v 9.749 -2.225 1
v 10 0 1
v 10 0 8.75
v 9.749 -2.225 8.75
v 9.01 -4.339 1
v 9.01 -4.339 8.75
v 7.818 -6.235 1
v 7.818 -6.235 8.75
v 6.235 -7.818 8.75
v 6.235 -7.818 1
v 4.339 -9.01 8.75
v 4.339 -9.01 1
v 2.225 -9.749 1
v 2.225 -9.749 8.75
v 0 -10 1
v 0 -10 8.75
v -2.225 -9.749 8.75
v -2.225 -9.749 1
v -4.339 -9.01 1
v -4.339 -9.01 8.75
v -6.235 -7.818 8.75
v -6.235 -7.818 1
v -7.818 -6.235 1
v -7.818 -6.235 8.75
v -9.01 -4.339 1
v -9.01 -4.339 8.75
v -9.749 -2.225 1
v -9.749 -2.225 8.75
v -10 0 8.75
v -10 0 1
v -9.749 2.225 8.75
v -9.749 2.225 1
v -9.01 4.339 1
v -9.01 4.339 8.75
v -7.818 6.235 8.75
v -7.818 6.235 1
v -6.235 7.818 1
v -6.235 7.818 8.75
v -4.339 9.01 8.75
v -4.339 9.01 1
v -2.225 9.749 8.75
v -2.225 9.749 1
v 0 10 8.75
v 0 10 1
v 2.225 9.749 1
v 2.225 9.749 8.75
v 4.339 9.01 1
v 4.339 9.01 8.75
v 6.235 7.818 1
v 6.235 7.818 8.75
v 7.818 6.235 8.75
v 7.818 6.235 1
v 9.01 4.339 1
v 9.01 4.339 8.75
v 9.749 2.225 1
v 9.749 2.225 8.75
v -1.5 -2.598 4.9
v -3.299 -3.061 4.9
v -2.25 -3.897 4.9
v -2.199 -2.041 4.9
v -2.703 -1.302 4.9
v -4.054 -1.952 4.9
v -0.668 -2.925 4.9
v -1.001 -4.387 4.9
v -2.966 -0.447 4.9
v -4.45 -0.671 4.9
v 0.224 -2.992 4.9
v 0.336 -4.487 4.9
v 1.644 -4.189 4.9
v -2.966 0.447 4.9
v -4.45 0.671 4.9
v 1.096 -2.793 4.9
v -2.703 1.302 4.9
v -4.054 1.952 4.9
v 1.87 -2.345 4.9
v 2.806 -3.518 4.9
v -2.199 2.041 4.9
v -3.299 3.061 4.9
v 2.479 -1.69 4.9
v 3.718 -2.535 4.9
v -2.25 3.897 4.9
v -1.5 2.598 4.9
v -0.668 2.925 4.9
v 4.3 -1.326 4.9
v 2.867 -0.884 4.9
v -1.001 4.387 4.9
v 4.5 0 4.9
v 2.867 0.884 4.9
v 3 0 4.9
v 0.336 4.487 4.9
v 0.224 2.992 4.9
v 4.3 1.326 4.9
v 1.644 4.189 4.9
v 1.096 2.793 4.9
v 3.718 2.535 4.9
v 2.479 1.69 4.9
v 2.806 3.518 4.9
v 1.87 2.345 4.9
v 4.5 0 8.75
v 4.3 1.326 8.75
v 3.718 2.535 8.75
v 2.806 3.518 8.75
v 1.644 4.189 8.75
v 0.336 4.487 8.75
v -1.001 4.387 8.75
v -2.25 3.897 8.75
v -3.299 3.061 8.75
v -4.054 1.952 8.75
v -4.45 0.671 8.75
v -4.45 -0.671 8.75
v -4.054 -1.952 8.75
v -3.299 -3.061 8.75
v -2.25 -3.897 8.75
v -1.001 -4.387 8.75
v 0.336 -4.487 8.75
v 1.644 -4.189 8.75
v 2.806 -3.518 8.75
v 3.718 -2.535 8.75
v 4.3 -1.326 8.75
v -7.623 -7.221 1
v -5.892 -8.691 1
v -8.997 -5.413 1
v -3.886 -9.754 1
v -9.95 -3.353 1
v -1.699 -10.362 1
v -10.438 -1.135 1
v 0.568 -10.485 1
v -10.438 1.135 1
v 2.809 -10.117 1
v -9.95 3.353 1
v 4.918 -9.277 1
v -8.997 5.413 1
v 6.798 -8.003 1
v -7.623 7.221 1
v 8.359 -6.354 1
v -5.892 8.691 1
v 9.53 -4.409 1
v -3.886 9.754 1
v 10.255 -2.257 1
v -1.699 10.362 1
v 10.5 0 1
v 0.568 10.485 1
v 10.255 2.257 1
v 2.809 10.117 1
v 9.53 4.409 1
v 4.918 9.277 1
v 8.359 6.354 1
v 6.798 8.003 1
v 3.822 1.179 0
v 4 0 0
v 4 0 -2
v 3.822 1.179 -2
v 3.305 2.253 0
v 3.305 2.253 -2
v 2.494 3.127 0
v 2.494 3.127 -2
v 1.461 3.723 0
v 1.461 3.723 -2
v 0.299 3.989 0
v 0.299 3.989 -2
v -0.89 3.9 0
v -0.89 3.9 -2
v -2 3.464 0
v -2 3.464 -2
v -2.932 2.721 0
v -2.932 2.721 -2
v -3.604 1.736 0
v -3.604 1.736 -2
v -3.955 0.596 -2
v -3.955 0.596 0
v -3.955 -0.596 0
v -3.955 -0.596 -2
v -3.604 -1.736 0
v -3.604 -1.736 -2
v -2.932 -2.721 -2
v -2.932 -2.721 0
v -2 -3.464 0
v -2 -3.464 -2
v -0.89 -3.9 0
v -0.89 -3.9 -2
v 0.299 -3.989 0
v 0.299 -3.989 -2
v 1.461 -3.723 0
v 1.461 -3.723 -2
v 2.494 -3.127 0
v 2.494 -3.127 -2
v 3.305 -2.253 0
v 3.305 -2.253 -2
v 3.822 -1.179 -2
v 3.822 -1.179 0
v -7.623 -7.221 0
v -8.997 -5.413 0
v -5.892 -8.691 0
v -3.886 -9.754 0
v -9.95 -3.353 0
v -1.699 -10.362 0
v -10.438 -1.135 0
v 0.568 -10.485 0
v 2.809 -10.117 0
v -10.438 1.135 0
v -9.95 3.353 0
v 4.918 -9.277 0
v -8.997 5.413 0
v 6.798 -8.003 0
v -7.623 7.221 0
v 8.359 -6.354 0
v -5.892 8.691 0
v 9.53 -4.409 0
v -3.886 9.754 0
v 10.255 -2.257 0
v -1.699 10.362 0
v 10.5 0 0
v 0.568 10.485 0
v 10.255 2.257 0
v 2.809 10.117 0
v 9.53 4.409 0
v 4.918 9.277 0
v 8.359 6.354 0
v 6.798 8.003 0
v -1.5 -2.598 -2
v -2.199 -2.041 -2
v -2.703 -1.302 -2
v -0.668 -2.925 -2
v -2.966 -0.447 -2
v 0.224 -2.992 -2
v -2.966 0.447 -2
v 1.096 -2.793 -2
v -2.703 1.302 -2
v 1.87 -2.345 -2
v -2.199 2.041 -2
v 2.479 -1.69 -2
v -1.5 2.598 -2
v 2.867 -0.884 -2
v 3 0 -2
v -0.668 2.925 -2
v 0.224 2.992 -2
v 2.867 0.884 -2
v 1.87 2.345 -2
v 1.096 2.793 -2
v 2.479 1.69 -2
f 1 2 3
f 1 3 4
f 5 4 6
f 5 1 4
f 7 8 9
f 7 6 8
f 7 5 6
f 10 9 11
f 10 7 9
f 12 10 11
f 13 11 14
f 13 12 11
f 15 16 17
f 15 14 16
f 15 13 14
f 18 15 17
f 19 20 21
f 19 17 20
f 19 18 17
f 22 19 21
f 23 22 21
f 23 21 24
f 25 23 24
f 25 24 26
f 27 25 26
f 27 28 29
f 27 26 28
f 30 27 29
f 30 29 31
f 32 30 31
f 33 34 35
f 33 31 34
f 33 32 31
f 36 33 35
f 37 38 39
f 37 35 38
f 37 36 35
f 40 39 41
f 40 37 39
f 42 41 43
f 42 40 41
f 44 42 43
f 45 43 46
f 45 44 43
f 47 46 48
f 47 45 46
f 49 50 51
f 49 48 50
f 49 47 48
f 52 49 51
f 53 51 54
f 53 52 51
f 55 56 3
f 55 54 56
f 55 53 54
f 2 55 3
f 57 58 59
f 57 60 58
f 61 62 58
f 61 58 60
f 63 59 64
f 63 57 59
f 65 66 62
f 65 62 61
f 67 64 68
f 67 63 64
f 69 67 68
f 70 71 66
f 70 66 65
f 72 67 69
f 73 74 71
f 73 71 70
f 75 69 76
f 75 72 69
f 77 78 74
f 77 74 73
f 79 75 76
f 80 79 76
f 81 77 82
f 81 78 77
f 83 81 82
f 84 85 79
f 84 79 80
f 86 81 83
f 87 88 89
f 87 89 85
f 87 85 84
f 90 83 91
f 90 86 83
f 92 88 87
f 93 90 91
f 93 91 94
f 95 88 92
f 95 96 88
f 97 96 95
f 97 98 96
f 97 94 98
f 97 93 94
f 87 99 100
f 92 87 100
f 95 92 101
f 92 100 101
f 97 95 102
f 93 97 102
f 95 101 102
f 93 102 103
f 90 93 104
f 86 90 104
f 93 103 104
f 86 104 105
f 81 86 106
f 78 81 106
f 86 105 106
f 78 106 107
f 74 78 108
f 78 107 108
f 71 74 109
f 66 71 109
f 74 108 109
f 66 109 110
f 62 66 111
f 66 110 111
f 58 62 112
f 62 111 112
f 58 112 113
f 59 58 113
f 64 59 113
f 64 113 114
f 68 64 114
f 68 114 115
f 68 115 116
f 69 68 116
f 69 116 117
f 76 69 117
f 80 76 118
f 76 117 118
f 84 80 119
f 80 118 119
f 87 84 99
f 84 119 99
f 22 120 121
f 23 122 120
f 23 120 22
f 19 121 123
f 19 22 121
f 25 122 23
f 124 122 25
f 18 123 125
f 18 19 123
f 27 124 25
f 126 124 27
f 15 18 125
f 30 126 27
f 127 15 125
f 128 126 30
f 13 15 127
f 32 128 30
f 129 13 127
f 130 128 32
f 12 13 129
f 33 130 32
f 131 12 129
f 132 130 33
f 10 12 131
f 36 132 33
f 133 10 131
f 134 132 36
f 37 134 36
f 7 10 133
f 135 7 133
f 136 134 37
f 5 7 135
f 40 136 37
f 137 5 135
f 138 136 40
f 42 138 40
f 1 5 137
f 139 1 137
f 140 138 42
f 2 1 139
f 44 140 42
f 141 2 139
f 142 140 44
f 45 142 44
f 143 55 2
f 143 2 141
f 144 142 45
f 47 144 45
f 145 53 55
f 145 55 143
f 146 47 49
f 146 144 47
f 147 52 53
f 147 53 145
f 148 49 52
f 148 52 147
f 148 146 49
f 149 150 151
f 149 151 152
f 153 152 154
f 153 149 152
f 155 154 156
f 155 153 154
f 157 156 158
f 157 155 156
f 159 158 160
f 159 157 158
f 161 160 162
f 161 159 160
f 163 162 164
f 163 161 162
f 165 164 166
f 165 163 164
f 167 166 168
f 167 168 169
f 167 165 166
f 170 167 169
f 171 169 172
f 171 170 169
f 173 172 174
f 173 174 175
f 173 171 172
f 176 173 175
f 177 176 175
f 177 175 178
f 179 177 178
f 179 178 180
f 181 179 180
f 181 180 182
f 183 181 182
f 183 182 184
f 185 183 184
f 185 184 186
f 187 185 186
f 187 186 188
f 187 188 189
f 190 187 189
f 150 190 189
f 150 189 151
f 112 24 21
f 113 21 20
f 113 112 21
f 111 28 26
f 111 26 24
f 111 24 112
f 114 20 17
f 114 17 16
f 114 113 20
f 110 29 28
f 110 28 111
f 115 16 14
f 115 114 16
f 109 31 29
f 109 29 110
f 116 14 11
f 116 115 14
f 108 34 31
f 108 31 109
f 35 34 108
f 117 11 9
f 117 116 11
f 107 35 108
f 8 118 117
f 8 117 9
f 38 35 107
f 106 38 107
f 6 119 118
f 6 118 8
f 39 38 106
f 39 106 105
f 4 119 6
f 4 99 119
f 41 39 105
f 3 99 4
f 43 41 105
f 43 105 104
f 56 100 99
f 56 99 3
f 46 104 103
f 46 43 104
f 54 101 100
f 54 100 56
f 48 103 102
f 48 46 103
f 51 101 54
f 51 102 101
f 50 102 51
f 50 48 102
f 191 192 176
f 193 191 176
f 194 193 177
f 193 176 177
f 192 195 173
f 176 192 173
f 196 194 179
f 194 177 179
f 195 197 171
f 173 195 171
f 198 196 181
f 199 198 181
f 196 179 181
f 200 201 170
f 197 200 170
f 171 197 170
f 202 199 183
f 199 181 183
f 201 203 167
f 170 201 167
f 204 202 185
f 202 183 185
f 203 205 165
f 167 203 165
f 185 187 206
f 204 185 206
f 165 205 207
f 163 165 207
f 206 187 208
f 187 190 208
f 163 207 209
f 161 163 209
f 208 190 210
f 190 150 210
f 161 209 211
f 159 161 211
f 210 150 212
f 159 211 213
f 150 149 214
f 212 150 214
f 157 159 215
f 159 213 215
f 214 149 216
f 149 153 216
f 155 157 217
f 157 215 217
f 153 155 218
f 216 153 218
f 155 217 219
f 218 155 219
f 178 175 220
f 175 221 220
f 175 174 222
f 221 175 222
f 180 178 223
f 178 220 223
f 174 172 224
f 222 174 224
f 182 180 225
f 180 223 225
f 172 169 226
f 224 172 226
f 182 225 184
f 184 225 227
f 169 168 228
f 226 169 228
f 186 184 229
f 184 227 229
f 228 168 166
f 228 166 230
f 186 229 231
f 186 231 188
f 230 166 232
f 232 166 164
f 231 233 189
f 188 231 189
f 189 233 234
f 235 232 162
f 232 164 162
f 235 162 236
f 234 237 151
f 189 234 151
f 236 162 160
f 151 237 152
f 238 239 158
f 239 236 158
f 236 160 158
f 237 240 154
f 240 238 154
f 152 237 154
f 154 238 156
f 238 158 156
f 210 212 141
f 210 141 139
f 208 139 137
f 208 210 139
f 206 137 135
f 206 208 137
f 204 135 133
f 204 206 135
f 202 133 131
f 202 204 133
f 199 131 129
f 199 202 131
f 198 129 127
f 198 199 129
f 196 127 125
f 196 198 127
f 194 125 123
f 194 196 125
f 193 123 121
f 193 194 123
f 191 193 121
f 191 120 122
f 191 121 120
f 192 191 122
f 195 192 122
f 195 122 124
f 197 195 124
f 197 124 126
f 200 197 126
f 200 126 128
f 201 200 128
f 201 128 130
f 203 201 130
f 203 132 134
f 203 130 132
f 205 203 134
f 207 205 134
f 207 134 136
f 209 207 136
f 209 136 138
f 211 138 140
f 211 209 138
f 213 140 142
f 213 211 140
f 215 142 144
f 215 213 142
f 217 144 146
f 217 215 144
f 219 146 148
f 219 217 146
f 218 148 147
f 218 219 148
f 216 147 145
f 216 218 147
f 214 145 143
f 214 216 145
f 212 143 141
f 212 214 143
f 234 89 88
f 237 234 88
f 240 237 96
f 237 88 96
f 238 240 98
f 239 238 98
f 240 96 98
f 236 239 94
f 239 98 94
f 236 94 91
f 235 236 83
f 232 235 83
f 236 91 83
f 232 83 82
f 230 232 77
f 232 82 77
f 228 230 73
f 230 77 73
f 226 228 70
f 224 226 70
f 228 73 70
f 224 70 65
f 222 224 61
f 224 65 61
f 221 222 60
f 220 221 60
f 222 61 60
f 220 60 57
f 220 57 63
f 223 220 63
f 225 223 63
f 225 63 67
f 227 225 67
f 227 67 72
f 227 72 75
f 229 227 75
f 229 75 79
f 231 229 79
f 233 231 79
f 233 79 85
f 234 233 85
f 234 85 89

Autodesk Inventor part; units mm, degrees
ref_plane "YZ Plane" through (0, 0, 0) normal (1, 0, 0) x (0, 1, 0)
ref_plane "XZ Plane" through (0, 0, 0) normal (0, 1, 0) x (-1, 0, 0)
ref_plane "XY Plane" through (0, 0, 0) normal (0, 0, 1) x (1, 0, 0)
sketch "スケッチ1" plane through (0, 0, 0) normal (0, 0, 1) x (1, 0, 0)
  circle A0 centre (0, 0) radius 10 construction
  circle A1 centre (0, 0) radius 10.5 construction
  circle A2 centre (0, 0) radius 3 construction
  circle A3 centre (0, 0) radius 9.5 construction
  circle A4 centre (0, 0) radius 1.5
  dimension "d0" = 20
  dimension "d1" = 21
  dimension "d2" = 6
  dimension "d3" = 19
  dimension "d10" = 3
sketch "スケッチ2" plane through (0, 0, 0) normal (0, 0, 1) x (1, 0, 0)
  circle A0 centre (0, 0) radius 9.5 construction
  circle A1 centre (0, 0) radius 10 construction
  circle A2 centre (0, 0) radius 9.5
  circle A3 centre (0, 0) radius 10
extrude "押し出し1" add sketch "スケッチ2" along normal blind 8.75
sketch "スケッチ4" plane through (0, 0, 0) normal (0, 0, 1) x (1, 0, 0)
  circle A0 centre (0, 0) radius 3 construction
  circle A1 centre (0, 0) radius 9.5 construction
  circle A2 centre (0, 0) radius 9.5
  circle A3 centre (0, 0) radius 10 projected
  circle A4 centre (0, 0) radius 3
extrude "押し出し3" add sketch "スケッチ4" along normal blind 8.75 contours A2 | A4
sketch "スケッチ6" plane through (0, 0, 0) normal (0, 0, 1) x (1, 0, 0)
  circle A0 centre (0, 0) radius 10 construction
  circle A1 centre (0, 0) radius 10.5 construction
  circle A2 centre (0, 0) radius 3 construction
  circle A3 centre (0, 0) radius 9.5 construction
  circle A4 centre (0, 0) radius 1.5
  circle A5 centre (0, 0) radius 10.5
  circle A6 centre (0, 0) radius 10
  circle A7 centre (0, 0) radius 10 projected
  circle A8 centre (0, 0) radius 9.5
  circle A9 centre (0, 0) radius 3
  dimension "d15" = 20
  dimension "d16" = 21
  dimension "d17" = 6
  dimension "d18" = 19
  dimension "d19" = 3
extrude "押し出し6" add sketch "スケッチ6" along normal blind 1 contours A5
sketch "スケッチ7" plane through (0, 0, 0) normal (0, 0, 1) x (1, 0, 0)
  circle A0 centre (0, 0) radius 10 construction
  circle A1 centre (0, 0) radius 10.5 construction
  circle A2 centre (0, 0) radius 3 construction
  circle A3 centre (0, 0) radius 9.5 construction
  circle A4 centre (0, 0) radius 1.5
  circle A5 centre (0, 0) radius 10.5
  circle A6 centre (0, 0) radius 10
  circle A7 centre (0, 0) radius 9.5
  circle A8 centre (0, 0) radius 3
  circle A9 centre (0, 0) radius 4
  dimension "d22" = 20
  dimension "d23" = 21
  dimension "d24" = 6
  dimension "d25" = 19
  dimension "d26" = 3
  dimension "d27" = 8
extrude "押し出し7" add sketch "スケッチ7" against normal blind 2 contours A9
sketch "スケッチ8" plane through (0, 0, 0) normal (0, 0, 1) x (1, 0, 0)
  circle A0 centre (0, 0) radius 10 construction
  circle A1 centre (0, 0) radius 10.5 construction
  circle A2 centre (0, 0) radius 3 construction
  circle A3 centre (0, 0) radius 9.5 construction
  circle A4 centre (0, 0) radius 1.5
  circle A5 centre (0, 0) radius 10.5
  circle A6 centre (0, 0) radius 10
  circle A7 centre (0, 0) radius 9.5
  circle A8 centre (0, 0) radius 3
  circle A9 centre (0, 0) radius 4
  dimension "d30" = 20
  dimension "d31" = 21
  dimension "d32" = 6
  dimension "d33" = 19
  dimension "d34" = 3
  dimension "d35" = 8
extrude "押し出し8" cut sketch "スケッチ8" along normal blind 20 contours A4
sketch "スケッチ9" plane through (0, 0, 0) normal (0, 0, 1) x (1, 0, 0)
  circle A0 centre (0, 0) radius 10 construction
  circle A1 centre (0, 0) radius 10.5 construction
  circle A2 centre (0, 0) radius 3 construction
  circle A3 centre (0, 0) radius 9.5 construction
  circle A4 centre (0, 0) radius 1.5
  circle A5 centre (0, 0) radius 10.5
  circle A6 centre (0, 0) radius 10
  circle A7 centre (0, 0) radius 9.5
  circle A8 centre (0, 0) radius 3
  circle A9 centre (0, 0) radius 4
  dimension "d38" = 20
  dimension "d39" = 21
  dimension "d40" = 6
  dimension "d41" = 19
  dimension "d42" = 3
  dimension "d43" = 8
extrude "押し出し9" cut sketch "スケッチ9" along normal blind 20 contours A8
ref_plane "作業平面1" through (0, 0, 8.75) normal (0, 0, 1) x (1, 0, 0)
sketch "スケッチ10" plane through (0, 0, 8.75) normal (0, 0, 1) x (1, 0, 0)
  circle A0 centre (0, 0) radius 4.5
  dimension "d47" = 9
extrude "押し出し10" cut sketch "スケッチ10" against normal blind 3.85
properties part number "wheel"
